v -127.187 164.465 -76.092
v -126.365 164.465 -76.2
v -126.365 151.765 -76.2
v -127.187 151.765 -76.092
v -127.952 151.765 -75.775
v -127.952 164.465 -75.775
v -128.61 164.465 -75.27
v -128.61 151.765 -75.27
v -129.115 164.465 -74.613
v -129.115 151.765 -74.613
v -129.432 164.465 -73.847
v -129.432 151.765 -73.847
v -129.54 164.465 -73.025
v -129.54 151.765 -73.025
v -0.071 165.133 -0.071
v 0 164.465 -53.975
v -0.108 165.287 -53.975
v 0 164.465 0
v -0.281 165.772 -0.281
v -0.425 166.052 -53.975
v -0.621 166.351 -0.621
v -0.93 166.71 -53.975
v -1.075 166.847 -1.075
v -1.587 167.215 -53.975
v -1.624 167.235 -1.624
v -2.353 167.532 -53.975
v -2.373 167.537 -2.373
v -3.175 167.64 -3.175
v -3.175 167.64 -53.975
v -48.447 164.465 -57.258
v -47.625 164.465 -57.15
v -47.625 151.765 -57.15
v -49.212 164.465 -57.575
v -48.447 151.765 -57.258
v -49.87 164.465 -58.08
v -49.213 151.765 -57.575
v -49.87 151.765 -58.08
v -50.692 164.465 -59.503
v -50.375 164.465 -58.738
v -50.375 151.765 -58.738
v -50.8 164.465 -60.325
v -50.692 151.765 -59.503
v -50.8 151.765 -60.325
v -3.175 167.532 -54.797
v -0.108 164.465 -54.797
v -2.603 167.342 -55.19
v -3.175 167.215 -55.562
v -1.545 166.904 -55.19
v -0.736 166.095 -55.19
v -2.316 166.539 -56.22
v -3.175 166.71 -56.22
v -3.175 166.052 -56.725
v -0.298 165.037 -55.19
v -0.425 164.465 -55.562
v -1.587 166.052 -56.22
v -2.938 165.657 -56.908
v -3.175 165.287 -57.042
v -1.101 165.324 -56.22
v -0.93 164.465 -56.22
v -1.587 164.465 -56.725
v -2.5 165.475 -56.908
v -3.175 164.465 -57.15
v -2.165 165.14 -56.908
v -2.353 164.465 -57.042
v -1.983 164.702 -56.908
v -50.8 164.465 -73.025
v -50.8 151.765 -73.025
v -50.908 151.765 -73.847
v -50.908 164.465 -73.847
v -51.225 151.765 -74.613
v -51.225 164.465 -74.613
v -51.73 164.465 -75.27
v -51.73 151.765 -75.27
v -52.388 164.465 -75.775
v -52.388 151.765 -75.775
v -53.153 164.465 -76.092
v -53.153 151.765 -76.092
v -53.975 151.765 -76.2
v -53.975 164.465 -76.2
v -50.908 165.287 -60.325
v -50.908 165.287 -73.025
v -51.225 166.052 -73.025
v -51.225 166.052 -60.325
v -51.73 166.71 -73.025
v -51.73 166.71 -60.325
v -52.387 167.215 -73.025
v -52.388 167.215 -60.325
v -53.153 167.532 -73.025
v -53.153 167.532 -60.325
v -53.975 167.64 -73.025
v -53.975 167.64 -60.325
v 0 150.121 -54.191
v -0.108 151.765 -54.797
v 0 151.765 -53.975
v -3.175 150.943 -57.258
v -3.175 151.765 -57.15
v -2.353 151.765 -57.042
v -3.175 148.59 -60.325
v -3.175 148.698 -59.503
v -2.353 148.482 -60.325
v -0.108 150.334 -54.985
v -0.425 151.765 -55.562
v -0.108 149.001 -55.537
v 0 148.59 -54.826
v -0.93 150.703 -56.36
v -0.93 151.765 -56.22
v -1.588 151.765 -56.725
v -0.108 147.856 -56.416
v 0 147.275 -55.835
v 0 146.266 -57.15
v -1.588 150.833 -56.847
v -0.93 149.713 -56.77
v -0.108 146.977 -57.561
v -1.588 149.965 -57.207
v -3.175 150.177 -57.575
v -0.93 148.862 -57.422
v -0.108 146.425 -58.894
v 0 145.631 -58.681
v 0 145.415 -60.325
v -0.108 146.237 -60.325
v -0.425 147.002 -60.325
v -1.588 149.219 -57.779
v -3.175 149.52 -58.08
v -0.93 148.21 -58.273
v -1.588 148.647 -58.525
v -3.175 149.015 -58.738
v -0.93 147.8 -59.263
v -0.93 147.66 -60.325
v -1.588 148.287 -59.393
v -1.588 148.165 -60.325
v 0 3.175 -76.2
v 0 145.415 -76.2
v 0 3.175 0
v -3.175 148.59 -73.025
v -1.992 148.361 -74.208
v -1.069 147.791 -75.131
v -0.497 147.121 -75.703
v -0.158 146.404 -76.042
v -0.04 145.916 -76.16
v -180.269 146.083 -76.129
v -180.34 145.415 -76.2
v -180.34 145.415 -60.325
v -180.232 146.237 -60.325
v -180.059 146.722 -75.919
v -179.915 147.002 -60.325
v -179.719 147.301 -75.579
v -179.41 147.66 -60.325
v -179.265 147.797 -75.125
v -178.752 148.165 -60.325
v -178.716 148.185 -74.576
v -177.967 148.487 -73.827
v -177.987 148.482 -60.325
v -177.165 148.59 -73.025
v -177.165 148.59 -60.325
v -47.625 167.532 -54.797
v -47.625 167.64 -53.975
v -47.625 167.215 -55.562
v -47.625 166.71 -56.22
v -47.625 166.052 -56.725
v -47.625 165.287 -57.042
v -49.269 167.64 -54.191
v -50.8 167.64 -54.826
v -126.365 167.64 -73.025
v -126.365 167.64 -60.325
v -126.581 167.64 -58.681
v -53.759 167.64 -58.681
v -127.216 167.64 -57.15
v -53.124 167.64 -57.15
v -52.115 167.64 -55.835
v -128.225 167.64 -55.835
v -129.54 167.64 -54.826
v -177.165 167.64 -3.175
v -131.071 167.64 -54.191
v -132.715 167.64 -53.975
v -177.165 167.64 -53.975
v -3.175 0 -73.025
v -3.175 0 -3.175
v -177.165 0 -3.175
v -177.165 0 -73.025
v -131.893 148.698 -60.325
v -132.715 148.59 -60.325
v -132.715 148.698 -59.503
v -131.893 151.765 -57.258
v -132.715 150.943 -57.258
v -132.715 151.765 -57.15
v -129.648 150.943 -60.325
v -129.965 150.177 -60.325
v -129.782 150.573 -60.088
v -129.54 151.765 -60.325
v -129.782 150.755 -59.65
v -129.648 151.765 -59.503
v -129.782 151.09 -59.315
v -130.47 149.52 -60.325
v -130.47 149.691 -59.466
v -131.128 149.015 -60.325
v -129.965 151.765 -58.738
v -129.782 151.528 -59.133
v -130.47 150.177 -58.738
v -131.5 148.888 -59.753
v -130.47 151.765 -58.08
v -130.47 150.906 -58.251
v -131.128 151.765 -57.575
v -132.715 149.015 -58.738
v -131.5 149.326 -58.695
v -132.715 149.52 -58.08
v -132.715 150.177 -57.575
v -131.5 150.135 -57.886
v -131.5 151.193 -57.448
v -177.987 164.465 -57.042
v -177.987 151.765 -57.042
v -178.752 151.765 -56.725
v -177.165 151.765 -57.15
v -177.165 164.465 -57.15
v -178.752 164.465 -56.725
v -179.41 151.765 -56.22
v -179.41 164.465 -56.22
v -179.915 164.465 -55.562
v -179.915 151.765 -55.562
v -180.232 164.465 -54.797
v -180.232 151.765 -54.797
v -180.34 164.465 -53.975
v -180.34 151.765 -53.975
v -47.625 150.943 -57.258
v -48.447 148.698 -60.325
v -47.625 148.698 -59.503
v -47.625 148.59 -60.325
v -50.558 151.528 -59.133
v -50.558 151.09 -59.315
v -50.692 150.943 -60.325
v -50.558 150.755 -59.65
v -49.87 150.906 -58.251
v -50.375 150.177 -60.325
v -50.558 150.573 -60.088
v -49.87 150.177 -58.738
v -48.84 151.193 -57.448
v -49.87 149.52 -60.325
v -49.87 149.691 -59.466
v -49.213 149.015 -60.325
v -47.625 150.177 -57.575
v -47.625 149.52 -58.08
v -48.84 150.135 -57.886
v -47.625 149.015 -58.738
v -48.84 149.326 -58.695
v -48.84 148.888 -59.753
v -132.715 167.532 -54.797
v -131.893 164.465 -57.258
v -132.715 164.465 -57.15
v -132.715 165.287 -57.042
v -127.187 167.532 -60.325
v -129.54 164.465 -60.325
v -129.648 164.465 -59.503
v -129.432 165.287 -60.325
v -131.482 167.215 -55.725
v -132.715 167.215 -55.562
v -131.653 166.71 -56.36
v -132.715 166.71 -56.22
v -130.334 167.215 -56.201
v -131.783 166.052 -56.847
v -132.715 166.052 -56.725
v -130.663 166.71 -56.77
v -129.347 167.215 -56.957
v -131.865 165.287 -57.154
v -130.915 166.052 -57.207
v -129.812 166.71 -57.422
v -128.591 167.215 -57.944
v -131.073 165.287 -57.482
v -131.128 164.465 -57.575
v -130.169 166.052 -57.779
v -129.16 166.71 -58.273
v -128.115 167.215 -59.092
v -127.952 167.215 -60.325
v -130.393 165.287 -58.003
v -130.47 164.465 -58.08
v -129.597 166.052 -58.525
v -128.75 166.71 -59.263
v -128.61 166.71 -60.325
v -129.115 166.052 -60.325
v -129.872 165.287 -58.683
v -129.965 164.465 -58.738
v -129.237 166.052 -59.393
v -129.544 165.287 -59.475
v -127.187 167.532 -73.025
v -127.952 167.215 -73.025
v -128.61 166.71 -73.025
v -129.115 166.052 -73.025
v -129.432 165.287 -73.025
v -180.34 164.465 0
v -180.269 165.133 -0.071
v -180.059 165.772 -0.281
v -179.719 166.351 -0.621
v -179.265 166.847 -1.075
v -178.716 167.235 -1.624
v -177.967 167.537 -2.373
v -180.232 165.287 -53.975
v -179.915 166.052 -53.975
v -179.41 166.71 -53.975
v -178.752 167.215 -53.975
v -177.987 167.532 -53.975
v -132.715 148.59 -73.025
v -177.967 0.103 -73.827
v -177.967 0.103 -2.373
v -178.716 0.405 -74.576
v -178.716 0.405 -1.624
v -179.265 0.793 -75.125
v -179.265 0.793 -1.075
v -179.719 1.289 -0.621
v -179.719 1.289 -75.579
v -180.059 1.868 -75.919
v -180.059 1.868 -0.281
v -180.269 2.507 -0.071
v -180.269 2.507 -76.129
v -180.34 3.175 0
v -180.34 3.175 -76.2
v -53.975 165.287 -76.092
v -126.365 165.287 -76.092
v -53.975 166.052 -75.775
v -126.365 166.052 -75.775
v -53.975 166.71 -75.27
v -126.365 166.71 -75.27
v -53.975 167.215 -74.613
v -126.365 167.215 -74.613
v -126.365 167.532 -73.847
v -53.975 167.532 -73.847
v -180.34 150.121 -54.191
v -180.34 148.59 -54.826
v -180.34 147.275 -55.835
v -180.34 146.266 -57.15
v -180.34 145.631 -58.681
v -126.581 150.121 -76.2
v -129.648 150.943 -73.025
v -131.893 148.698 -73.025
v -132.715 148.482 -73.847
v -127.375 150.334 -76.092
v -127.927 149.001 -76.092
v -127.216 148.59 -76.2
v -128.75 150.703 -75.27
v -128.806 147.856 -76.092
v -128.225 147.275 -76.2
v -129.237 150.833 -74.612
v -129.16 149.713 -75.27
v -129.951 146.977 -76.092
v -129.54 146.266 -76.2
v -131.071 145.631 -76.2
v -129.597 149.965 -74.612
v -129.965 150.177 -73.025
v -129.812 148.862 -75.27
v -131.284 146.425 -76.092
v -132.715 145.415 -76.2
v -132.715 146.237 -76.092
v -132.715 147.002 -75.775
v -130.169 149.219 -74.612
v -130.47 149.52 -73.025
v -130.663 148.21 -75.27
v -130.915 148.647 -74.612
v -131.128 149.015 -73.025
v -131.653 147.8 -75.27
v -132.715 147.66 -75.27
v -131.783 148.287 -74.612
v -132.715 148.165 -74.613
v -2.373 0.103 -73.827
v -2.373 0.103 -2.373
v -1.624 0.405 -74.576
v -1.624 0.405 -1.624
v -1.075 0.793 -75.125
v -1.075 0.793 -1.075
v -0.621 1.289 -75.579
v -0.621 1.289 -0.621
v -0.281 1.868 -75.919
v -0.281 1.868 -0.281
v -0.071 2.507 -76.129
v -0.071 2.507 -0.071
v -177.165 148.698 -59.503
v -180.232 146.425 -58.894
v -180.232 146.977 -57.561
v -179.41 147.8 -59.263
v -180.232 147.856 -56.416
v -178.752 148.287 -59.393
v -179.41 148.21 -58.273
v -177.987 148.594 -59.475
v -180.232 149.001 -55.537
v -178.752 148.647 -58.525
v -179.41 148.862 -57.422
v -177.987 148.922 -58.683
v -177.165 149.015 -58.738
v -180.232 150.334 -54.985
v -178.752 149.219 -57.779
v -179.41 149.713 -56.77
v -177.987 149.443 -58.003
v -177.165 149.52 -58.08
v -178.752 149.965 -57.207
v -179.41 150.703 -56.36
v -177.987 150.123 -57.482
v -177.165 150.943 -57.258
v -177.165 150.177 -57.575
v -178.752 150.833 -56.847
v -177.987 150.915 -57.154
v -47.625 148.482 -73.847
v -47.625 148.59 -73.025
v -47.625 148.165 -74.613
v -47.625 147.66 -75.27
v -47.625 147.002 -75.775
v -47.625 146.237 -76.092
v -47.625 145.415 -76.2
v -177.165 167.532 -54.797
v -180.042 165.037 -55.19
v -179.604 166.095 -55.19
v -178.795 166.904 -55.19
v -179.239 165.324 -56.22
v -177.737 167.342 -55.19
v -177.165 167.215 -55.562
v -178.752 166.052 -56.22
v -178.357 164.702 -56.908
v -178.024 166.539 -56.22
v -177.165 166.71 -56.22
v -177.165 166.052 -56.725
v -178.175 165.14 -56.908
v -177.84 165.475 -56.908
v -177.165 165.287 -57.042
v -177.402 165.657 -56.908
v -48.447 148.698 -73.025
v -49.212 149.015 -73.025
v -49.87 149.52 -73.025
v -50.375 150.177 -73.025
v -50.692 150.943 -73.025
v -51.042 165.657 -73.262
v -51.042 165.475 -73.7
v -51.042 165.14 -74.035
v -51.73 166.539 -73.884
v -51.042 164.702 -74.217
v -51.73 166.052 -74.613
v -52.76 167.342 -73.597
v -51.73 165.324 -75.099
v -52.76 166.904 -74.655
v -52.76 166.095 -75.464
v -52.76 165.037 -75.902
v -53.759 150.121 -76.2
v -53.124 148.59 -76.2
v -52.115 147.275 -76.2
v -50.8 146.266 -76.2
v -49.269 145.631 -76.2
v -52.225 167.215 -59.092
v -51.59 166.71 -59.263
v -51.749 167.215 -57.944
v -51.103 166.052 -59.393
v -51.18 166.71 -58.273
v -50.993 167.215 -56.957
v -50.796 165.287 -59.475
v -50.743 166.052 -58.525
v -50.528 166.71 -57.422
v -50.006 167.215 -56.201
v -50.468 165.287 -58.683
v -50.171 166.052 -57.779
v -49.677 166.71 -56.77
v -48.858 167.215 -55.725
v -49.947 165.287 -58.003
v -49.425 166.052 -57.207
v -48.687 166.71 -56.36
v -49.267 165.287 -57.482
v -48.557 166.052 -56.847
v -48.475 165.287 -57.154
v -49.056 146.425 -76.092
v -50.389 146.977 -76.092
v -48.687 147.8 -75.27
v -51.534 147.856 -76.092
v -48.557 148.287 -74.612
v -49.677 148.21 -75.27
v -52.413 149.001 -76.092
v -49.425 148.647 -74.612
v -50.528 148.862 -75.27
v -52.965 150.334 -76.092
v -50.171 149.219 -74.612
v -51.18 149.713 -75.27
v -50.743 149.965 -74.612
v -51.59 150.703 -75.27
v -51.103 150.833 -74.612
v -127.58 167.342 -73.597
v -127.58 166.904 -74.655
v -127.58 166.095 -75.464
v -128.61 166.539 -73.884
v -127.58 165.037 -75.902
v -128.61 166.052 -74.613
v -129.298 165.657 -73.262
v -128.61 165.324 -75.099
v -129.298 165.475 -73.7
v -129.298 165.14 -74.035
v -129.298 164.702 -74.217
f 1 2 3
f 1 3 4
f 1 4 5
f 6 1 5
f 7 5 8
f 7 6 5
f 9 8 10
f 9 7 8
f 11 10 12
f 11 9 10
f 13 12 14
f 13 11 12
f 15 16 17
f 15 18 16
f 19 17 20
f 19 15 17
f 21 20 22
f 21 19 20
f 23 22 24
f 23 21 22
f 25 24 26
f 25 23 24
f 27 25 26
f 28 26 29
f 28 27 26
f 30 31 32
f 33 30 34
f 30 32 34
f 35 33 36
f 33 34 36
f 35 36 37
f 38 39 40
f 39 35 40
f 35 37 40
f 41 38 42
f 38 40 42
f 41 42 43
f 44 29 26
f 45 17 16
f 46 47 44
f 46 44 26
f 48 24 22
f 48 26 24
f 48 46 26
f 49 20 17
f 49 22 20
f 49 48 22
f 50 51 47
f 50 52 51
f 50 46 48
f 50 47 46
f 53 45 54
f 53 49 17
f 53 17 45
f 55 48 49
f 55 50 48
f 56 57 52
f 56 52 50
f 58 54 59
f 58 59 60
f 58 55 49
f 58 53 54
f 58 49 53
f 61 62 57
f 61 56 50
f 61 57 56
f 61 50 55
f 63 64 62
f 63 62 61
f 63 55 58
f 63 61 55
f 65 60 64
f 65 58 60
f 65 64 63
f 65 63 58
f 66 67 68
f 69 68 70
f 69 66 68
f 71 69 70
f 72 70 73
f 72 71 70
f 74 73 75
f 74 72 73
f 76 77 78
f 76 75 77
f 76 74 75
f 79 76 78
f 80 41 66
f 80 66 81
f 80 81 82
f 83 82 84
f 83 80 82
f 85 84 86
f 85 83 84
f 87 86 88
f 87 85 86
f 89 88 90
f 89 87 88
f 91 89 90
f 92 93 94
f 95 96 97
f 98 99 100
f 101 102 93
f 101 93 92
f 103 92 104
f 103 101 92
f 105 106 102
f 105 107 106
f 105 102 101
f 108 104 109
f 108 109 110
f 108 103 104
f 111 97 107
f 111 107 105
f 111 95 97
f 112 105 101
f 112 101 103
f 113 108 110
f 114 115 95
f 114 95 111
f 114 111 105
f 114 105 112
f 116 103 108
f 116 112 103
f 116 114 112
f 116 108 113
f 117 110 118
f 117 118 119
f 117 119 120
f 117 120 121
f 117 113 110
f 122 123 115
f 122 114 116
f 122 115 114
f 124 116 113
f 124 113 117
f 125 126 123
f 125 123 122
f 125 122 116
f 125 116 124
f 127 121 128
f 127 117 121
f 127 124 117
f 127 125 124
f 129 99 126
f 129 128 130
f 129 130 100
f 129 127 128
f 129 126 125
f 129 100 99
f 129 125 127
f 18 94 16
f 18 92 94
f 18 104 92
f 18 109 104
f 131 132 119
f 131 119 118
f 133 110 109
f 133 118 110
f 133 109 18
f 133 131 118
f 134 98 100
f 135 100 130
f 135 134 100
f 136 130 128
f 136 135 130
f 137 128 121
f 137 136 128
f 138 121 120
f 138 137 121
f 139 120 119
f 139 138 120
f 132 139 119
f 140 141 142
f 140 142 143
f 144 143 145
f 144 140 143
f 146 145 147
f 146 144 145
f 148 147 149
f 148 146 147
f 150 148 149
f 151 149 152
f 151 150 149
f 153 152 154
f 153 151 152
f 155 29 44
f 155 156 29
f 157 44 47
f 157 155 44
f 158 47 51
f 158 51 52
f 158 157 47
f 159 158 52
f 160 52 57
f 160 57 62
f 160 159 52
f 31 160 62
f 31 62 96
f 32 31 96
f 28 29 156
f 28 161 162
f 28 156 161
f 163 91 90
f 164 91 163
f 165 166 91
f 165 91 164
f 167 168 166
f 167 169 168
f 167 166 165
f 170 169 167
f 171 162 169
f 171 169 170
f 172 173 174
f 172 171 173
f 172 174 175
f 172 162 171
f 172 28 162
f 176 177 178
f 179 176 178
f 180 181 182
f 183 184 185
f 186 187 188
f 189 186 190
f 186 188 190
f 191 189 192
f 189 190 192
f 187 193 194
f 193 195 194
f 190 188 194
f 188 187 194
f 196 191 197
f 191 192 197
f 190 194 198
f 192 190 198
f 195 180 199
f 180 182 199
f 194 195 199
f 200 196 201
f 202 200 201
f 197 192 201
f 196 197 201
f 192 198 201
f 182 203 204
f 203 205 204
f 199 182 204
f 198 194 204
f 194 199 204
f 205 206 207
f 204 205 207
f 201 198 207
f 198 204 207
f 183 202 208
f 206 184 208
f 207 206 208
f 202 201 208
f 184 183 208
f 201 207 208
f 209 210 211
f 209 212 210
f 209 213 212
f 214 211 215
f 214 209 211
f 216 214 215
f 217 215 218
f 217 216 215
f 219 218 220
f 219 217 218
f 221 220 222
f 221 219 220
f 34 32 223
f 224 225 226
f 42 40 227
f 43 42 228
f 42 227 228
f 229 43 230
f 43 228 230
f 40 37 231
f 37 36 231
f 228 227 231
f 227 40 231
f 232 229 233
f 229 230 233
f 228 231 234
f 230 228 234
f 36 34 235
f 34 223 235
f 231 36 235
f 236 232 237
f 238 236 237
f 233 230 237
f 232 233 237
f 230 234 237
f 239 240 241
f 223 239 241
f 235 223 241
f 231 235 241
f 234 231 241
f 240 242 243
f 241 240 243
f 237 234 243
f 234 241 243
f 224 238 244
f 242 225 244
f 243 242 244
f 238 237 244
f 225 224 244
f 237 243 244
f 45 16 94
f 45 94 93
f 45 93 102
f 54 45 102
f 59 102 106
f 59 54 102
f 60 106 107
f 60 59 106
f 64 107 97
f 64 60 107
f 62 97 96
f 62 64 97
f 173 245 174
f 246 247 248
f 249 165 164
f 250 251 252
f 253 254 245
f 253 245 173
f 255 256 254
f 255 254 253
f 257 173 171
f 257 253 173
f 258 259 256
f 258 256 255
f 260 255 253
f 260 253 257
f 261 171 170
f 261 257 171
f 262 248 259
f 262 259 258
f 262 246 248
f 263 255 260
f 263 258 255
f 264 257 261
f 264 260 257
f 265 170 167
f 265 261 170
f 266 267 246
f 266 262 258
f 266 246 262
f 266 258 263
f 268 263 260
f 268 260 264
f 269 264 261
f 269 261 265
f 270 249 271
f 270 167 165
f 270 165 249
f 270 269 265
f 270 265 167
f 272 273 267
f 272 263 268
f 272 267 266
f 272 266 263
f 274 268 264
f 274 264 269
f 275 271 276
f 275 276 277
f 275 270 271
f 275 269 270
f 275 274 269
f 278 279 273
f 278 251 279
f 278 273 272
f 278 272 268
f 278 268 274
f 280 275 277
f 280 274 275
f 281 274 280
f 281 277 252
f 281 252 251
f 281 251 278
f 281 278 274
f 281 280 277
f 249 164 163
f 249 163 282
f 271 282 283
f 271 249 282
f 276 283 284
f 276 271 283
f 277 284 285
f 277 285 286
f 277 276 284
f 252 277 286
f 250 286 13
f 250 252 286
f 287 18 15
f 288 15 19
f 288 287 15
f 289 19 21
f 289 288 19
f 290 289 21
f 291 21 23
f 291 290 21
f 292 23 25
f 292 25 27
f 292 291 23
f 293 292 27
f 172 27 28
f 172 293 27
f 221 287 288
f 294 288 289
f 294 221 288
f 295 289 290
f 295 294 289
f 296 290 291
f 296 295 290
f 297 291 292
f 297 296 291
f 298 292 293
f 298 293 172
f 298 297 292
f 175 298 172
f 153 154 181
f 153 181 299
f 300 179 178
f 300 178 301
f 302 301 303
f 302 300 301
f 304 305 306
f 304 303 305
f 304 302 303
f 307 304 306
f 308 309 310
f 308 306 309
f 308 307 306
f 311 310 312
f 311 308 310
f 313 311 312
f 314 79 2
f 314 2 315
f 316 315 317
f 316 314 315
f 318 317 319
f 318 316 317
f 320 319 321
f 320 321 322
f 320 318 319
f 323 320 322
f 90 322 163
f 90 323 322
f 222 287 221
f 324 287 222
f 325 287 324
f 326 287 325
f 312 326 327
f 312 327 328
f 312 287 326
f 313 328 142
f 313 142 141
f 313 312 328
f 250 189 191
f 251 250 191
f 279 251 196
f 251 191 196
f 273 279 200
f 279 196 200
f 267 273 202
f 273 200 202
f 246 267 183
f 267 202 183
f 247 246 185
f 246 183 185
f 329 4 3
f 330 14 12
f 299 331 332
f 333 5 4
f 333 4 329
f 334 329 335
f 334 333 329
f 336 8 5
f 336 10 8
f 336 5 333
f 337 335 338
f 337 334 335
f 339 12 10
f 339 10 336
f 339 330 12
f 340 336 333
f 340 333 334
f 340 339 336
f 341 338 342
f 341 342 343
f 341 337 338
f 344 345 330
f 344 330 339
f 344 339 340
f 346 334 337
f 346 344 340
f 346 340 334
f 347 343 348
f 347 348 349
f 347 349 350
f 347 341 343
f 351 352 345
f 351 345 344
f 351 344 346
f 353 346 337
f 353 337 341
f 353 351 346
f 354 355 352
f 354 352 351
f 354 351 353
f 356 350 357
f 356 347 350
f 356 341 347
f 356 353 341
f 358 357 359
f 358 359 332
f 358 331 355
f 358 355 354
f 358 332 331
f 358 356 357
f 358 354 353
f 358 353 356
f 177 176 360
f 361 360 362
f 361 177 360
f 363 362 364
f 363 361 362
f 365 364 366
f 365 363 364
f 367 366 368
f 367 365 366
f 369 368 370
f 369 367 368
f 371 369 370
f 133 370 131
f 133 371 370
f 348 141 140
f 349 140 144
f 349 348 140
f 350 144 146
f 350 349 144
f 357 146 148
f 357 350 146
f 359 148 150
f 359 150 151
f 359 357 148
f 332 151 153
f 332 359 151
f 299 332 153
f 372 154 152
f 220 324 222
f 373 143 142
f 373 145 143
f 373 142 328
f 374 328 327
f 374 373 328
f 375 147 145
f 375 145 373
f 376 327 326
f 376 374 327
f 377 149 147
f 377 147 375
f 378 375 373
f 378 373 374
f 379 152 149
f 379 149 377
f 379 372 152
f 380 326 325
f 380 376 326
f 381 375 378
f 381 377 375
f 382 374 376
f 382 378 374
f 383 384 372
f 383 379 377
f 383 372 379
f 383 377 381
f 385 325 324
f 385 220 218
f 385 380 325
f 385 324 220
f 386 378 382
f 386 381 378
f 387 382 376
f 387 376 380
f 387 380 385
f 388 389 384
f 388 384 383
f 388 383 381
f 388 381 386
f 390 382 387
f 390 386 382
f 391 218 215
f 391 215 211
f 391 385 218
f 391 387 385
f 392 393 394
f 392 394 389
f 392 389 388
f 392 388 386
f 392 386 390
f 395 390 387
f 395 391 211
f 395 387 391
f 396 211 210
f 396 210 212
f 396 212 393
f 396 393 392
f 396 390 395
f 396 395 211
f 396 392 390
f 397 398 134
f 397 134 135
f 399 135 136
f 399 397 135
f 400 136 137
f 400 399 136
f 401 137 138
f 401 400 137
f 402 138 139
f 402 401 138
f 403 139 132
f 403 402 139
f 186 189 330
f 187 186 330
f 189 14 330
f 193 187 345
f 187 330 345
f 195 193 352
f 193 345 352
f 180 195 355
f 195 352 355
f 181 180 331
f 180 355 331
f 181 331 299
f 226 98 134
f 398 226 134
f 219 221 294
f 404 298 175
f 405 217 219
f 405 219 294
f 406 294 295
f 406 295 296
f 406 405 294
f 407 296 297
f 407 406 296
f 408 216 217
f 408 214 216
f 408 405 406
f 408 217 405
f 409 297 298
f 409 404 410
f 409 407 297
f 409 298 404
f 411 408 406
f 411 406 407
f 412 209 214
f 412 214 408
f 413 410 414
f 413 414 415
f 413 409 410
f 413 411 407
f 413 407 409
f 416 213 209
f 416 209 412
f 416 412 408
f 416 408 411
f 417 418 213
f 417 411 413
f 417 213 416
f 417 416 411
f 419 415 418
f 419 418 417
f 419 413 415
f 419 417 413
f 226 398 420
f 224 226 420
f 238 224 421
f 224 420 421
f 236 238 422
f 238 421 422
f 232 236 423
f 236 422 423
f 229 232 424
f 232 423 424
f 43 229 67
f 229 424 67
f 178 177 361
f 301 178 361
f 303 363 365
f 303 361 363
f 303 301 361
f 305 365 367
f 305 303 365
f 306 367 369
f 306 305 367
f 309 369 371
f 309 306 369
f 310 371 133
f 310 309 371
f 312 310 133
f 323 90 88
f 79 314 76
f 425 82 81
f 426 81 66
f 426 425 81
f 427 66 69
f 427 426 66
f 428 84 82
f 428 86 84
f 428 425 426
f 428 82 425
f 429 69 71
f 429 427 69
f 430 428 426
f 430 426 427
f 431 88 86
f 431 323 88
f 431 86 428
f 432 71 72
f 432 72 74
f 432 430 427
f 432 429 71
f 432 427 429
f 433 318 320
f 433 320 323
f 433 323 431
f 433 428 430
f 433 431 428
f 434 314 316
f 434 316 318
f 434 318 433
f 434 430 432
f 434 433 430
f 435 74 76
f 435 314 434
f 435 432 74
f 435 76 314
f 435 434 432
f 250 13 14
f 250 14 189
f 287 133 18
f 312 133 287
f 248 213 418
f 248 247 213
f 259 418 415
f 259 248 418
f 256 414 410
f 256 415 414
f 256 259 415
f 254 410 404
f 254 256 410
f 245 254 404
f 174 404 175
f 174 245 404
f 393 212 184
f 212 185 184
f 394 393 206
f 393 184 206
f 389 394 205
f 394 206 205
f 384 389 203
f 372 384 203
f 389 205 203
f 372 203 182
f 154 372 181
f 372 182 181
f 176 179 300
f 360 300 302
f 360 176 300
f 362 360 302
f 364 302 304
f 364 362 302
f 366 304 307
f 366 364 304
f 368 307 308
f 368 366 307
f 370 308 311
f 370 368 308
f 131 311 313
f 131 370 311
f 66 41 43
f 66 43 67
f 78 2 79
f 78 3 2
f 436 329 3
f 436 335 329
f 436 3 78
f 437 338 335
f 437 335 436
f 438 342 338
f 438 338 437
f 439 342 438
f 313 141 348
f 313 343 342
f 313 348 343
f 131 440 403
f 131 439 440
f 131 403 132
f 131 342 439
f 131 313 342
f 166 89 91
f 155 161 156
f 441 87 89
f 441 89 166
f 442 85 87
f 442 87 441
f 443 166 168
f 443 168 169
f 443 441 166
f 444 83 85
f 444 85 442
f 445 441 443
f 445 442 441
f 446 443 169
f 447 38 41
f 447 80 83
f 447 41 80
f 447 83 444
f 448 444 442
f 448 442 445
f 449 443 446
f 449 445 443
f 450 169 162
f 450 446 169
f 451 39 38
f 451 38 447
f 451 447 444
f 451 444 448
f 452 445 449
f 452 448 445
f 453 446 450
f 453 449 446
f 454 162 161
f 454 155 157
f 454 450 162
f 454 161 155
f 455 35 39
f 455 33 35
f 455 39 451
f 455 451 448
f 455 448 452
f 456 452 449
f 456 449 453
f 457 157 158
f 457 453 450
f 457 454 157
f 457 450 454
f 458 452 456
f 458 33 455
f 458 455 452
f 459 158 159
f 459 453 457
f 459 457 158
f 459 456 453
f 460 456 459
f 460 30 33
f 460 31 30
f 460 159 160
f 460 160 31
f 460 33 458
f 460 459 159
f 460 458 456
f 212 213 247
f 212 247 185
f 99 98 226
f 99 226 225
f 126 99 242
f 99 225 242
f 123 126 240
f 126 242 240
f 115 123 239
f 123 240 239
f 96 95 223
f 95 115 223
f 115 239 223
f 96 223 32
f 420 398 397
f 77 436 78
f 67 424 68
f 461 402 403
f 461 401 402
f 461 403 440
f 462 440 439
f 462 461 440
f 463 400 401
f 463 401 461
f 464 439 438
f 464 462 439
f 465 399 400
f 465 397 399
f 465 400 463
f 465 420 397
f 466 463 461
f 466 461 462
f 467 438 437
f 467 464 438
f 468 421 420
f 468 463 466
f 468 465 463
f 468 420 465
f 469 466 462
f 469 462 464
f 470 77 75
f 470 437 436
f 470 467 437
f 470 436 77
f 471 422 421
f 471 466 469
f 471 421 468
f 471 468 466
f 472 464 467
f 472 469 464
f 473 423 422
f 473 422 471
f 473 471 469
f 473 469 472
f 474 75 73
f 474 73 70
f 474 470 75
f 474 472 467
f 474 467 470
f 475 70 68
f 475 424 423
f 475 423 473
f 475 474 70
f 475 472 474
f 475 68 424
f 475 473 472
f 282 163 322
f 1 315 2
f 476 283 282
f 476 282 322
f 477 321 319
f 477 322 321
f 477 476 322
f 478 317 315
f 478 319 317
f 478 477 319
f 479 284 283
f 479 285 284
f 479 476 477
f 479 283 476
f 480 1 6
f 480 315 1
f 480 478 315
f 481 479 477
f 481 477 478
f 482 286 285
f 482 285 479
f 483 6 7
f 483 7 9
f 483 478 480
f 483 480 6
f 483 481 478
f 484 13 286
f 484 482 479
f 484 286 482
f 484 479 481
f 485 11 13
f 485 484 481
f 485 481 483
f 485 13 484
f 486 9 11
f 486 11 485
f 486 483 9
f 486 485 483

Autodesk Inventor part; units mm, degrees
ref_plane "YZ Plane" through (0, 0, 0) normal (1, 0, 0) x (0, 1, 0)
ref_plane "XZ Plane" through (0, 0, 0) normal (0, 1, 0) x (-1, 0, 0)
ref_plane "XY Plane" through (0, 0, 0) normal (0, 0, 1) x (1, 0, 0)
sketch "Sketch1" plane through (0, 0, 0) normal (0, 1, 0) x (-1, 0, 0)
  line L0 (0, 0) -> (180.34, 0)
  line L1 (180.34, 0) -> (180.34, -76.2)
  line L2 (180.34, -76.2) -> (0, -76.2)
  line L3 (0, -76.2) -> (0, 0)
  dimension "d0" = 180.34
  dimension "d1" = 76.2
extrude "Extrusion1" add sketch "Sketch1" along normal blind 167.64
fillet "Fillet1" radius 3.175 8 edges at (-90.17, 167.64, 0) (-180.34, 167.64, -38.1) (-90.17, 167.64, -76.2) (0, 167.64, -38.1) (-90.17, 0, -76.2) (-180.34, 0, -38.1) (-90.17, 0, 0) (0, 0, -38.1)
sketch "Sketch2" plane through (0, 3.175, -76.2) normal (1, 0, 0) x (0, 0, -1)
  line L0 (0, 164.465) -> (-19.05, 164.465)
  line L1 (-19.05, 164.465) -> (-19.05, 145.415)
  line L2 (-19.05, 145.415) -> (0, 145.415)
  line L3 (0, 145.415) -> (0, 164.465)
  line L4 (0, 164.465) -> (-19.05, 164.465)
  line L5 (-19.05, 164.465) -> (-19.05, 145.415)
  line L6 (-19.05, 145.415) -> (0, 145.415)
  line L7 (0, 145.415) -> (0, 164.465)
  point P0 (-76.2, -3.175)
  dimension "d5" = 19.05
  dimension "d6" = 19.05
extrude "Extrusion2" cut sketch "Sketch2" against normal blind 50.8
sketch "Sketch3" plane through (-180.34, 3.175, 0) normal (-1, 0, 0) x (0, 0, 1)
  line L0 (-76.2, 164.465) -> (-57.15, 164.465)
  line L1 (-57.15, 164.465) -> (-57.15, 145.415)
  line L2 (-57.15, 145.415) -> (-76.2, 145.415)
  line L3 (-76.2, 145.415) -> (-76.2, 164.465)
  point P0 (0, -3.175)
  dimension "d9" = 19.05
  dimension "d10" = 19.05
extrude "Extrusion3" cut sketch "Sketch3" against normal blind 50.8
fillet "Fillet2" radius 3.175 22 edges at (-154.94, 148.59, -57.15) (-129.54, 148.59, -66.675) (-129.54, 158.115, -57.15) (-179.4101, 166.7101, -57.15) (-180.34, 156.5275, -57.15) (-153.3525, 167.64, -57.15) (-129.54, 166.7101, -75.2701) (-129.54, 156.5275, -76.2) (-129.54, 167.64, -65.0875) (-154.94, 148.59, -76.2) (-180.34, 148.59, -66.675) (-25.4, 148.59, -76.2) (-50.8, 166.7101, -75.2701) (-50.8, 167.64, -65.0875) (-50.8, 156.5275, -76.2) (-0.9299, 166.7101, -57.15) (0, 156.5275, -57.15) (-26.9875, 167.64, -57.15) (0, 148.59, -66.675) (-25.4, 148.59, -57.15) (-50.8, 148.59, -66.675) (-50.8, 158.115, -57.15)
properties part number "FRC Battery"
